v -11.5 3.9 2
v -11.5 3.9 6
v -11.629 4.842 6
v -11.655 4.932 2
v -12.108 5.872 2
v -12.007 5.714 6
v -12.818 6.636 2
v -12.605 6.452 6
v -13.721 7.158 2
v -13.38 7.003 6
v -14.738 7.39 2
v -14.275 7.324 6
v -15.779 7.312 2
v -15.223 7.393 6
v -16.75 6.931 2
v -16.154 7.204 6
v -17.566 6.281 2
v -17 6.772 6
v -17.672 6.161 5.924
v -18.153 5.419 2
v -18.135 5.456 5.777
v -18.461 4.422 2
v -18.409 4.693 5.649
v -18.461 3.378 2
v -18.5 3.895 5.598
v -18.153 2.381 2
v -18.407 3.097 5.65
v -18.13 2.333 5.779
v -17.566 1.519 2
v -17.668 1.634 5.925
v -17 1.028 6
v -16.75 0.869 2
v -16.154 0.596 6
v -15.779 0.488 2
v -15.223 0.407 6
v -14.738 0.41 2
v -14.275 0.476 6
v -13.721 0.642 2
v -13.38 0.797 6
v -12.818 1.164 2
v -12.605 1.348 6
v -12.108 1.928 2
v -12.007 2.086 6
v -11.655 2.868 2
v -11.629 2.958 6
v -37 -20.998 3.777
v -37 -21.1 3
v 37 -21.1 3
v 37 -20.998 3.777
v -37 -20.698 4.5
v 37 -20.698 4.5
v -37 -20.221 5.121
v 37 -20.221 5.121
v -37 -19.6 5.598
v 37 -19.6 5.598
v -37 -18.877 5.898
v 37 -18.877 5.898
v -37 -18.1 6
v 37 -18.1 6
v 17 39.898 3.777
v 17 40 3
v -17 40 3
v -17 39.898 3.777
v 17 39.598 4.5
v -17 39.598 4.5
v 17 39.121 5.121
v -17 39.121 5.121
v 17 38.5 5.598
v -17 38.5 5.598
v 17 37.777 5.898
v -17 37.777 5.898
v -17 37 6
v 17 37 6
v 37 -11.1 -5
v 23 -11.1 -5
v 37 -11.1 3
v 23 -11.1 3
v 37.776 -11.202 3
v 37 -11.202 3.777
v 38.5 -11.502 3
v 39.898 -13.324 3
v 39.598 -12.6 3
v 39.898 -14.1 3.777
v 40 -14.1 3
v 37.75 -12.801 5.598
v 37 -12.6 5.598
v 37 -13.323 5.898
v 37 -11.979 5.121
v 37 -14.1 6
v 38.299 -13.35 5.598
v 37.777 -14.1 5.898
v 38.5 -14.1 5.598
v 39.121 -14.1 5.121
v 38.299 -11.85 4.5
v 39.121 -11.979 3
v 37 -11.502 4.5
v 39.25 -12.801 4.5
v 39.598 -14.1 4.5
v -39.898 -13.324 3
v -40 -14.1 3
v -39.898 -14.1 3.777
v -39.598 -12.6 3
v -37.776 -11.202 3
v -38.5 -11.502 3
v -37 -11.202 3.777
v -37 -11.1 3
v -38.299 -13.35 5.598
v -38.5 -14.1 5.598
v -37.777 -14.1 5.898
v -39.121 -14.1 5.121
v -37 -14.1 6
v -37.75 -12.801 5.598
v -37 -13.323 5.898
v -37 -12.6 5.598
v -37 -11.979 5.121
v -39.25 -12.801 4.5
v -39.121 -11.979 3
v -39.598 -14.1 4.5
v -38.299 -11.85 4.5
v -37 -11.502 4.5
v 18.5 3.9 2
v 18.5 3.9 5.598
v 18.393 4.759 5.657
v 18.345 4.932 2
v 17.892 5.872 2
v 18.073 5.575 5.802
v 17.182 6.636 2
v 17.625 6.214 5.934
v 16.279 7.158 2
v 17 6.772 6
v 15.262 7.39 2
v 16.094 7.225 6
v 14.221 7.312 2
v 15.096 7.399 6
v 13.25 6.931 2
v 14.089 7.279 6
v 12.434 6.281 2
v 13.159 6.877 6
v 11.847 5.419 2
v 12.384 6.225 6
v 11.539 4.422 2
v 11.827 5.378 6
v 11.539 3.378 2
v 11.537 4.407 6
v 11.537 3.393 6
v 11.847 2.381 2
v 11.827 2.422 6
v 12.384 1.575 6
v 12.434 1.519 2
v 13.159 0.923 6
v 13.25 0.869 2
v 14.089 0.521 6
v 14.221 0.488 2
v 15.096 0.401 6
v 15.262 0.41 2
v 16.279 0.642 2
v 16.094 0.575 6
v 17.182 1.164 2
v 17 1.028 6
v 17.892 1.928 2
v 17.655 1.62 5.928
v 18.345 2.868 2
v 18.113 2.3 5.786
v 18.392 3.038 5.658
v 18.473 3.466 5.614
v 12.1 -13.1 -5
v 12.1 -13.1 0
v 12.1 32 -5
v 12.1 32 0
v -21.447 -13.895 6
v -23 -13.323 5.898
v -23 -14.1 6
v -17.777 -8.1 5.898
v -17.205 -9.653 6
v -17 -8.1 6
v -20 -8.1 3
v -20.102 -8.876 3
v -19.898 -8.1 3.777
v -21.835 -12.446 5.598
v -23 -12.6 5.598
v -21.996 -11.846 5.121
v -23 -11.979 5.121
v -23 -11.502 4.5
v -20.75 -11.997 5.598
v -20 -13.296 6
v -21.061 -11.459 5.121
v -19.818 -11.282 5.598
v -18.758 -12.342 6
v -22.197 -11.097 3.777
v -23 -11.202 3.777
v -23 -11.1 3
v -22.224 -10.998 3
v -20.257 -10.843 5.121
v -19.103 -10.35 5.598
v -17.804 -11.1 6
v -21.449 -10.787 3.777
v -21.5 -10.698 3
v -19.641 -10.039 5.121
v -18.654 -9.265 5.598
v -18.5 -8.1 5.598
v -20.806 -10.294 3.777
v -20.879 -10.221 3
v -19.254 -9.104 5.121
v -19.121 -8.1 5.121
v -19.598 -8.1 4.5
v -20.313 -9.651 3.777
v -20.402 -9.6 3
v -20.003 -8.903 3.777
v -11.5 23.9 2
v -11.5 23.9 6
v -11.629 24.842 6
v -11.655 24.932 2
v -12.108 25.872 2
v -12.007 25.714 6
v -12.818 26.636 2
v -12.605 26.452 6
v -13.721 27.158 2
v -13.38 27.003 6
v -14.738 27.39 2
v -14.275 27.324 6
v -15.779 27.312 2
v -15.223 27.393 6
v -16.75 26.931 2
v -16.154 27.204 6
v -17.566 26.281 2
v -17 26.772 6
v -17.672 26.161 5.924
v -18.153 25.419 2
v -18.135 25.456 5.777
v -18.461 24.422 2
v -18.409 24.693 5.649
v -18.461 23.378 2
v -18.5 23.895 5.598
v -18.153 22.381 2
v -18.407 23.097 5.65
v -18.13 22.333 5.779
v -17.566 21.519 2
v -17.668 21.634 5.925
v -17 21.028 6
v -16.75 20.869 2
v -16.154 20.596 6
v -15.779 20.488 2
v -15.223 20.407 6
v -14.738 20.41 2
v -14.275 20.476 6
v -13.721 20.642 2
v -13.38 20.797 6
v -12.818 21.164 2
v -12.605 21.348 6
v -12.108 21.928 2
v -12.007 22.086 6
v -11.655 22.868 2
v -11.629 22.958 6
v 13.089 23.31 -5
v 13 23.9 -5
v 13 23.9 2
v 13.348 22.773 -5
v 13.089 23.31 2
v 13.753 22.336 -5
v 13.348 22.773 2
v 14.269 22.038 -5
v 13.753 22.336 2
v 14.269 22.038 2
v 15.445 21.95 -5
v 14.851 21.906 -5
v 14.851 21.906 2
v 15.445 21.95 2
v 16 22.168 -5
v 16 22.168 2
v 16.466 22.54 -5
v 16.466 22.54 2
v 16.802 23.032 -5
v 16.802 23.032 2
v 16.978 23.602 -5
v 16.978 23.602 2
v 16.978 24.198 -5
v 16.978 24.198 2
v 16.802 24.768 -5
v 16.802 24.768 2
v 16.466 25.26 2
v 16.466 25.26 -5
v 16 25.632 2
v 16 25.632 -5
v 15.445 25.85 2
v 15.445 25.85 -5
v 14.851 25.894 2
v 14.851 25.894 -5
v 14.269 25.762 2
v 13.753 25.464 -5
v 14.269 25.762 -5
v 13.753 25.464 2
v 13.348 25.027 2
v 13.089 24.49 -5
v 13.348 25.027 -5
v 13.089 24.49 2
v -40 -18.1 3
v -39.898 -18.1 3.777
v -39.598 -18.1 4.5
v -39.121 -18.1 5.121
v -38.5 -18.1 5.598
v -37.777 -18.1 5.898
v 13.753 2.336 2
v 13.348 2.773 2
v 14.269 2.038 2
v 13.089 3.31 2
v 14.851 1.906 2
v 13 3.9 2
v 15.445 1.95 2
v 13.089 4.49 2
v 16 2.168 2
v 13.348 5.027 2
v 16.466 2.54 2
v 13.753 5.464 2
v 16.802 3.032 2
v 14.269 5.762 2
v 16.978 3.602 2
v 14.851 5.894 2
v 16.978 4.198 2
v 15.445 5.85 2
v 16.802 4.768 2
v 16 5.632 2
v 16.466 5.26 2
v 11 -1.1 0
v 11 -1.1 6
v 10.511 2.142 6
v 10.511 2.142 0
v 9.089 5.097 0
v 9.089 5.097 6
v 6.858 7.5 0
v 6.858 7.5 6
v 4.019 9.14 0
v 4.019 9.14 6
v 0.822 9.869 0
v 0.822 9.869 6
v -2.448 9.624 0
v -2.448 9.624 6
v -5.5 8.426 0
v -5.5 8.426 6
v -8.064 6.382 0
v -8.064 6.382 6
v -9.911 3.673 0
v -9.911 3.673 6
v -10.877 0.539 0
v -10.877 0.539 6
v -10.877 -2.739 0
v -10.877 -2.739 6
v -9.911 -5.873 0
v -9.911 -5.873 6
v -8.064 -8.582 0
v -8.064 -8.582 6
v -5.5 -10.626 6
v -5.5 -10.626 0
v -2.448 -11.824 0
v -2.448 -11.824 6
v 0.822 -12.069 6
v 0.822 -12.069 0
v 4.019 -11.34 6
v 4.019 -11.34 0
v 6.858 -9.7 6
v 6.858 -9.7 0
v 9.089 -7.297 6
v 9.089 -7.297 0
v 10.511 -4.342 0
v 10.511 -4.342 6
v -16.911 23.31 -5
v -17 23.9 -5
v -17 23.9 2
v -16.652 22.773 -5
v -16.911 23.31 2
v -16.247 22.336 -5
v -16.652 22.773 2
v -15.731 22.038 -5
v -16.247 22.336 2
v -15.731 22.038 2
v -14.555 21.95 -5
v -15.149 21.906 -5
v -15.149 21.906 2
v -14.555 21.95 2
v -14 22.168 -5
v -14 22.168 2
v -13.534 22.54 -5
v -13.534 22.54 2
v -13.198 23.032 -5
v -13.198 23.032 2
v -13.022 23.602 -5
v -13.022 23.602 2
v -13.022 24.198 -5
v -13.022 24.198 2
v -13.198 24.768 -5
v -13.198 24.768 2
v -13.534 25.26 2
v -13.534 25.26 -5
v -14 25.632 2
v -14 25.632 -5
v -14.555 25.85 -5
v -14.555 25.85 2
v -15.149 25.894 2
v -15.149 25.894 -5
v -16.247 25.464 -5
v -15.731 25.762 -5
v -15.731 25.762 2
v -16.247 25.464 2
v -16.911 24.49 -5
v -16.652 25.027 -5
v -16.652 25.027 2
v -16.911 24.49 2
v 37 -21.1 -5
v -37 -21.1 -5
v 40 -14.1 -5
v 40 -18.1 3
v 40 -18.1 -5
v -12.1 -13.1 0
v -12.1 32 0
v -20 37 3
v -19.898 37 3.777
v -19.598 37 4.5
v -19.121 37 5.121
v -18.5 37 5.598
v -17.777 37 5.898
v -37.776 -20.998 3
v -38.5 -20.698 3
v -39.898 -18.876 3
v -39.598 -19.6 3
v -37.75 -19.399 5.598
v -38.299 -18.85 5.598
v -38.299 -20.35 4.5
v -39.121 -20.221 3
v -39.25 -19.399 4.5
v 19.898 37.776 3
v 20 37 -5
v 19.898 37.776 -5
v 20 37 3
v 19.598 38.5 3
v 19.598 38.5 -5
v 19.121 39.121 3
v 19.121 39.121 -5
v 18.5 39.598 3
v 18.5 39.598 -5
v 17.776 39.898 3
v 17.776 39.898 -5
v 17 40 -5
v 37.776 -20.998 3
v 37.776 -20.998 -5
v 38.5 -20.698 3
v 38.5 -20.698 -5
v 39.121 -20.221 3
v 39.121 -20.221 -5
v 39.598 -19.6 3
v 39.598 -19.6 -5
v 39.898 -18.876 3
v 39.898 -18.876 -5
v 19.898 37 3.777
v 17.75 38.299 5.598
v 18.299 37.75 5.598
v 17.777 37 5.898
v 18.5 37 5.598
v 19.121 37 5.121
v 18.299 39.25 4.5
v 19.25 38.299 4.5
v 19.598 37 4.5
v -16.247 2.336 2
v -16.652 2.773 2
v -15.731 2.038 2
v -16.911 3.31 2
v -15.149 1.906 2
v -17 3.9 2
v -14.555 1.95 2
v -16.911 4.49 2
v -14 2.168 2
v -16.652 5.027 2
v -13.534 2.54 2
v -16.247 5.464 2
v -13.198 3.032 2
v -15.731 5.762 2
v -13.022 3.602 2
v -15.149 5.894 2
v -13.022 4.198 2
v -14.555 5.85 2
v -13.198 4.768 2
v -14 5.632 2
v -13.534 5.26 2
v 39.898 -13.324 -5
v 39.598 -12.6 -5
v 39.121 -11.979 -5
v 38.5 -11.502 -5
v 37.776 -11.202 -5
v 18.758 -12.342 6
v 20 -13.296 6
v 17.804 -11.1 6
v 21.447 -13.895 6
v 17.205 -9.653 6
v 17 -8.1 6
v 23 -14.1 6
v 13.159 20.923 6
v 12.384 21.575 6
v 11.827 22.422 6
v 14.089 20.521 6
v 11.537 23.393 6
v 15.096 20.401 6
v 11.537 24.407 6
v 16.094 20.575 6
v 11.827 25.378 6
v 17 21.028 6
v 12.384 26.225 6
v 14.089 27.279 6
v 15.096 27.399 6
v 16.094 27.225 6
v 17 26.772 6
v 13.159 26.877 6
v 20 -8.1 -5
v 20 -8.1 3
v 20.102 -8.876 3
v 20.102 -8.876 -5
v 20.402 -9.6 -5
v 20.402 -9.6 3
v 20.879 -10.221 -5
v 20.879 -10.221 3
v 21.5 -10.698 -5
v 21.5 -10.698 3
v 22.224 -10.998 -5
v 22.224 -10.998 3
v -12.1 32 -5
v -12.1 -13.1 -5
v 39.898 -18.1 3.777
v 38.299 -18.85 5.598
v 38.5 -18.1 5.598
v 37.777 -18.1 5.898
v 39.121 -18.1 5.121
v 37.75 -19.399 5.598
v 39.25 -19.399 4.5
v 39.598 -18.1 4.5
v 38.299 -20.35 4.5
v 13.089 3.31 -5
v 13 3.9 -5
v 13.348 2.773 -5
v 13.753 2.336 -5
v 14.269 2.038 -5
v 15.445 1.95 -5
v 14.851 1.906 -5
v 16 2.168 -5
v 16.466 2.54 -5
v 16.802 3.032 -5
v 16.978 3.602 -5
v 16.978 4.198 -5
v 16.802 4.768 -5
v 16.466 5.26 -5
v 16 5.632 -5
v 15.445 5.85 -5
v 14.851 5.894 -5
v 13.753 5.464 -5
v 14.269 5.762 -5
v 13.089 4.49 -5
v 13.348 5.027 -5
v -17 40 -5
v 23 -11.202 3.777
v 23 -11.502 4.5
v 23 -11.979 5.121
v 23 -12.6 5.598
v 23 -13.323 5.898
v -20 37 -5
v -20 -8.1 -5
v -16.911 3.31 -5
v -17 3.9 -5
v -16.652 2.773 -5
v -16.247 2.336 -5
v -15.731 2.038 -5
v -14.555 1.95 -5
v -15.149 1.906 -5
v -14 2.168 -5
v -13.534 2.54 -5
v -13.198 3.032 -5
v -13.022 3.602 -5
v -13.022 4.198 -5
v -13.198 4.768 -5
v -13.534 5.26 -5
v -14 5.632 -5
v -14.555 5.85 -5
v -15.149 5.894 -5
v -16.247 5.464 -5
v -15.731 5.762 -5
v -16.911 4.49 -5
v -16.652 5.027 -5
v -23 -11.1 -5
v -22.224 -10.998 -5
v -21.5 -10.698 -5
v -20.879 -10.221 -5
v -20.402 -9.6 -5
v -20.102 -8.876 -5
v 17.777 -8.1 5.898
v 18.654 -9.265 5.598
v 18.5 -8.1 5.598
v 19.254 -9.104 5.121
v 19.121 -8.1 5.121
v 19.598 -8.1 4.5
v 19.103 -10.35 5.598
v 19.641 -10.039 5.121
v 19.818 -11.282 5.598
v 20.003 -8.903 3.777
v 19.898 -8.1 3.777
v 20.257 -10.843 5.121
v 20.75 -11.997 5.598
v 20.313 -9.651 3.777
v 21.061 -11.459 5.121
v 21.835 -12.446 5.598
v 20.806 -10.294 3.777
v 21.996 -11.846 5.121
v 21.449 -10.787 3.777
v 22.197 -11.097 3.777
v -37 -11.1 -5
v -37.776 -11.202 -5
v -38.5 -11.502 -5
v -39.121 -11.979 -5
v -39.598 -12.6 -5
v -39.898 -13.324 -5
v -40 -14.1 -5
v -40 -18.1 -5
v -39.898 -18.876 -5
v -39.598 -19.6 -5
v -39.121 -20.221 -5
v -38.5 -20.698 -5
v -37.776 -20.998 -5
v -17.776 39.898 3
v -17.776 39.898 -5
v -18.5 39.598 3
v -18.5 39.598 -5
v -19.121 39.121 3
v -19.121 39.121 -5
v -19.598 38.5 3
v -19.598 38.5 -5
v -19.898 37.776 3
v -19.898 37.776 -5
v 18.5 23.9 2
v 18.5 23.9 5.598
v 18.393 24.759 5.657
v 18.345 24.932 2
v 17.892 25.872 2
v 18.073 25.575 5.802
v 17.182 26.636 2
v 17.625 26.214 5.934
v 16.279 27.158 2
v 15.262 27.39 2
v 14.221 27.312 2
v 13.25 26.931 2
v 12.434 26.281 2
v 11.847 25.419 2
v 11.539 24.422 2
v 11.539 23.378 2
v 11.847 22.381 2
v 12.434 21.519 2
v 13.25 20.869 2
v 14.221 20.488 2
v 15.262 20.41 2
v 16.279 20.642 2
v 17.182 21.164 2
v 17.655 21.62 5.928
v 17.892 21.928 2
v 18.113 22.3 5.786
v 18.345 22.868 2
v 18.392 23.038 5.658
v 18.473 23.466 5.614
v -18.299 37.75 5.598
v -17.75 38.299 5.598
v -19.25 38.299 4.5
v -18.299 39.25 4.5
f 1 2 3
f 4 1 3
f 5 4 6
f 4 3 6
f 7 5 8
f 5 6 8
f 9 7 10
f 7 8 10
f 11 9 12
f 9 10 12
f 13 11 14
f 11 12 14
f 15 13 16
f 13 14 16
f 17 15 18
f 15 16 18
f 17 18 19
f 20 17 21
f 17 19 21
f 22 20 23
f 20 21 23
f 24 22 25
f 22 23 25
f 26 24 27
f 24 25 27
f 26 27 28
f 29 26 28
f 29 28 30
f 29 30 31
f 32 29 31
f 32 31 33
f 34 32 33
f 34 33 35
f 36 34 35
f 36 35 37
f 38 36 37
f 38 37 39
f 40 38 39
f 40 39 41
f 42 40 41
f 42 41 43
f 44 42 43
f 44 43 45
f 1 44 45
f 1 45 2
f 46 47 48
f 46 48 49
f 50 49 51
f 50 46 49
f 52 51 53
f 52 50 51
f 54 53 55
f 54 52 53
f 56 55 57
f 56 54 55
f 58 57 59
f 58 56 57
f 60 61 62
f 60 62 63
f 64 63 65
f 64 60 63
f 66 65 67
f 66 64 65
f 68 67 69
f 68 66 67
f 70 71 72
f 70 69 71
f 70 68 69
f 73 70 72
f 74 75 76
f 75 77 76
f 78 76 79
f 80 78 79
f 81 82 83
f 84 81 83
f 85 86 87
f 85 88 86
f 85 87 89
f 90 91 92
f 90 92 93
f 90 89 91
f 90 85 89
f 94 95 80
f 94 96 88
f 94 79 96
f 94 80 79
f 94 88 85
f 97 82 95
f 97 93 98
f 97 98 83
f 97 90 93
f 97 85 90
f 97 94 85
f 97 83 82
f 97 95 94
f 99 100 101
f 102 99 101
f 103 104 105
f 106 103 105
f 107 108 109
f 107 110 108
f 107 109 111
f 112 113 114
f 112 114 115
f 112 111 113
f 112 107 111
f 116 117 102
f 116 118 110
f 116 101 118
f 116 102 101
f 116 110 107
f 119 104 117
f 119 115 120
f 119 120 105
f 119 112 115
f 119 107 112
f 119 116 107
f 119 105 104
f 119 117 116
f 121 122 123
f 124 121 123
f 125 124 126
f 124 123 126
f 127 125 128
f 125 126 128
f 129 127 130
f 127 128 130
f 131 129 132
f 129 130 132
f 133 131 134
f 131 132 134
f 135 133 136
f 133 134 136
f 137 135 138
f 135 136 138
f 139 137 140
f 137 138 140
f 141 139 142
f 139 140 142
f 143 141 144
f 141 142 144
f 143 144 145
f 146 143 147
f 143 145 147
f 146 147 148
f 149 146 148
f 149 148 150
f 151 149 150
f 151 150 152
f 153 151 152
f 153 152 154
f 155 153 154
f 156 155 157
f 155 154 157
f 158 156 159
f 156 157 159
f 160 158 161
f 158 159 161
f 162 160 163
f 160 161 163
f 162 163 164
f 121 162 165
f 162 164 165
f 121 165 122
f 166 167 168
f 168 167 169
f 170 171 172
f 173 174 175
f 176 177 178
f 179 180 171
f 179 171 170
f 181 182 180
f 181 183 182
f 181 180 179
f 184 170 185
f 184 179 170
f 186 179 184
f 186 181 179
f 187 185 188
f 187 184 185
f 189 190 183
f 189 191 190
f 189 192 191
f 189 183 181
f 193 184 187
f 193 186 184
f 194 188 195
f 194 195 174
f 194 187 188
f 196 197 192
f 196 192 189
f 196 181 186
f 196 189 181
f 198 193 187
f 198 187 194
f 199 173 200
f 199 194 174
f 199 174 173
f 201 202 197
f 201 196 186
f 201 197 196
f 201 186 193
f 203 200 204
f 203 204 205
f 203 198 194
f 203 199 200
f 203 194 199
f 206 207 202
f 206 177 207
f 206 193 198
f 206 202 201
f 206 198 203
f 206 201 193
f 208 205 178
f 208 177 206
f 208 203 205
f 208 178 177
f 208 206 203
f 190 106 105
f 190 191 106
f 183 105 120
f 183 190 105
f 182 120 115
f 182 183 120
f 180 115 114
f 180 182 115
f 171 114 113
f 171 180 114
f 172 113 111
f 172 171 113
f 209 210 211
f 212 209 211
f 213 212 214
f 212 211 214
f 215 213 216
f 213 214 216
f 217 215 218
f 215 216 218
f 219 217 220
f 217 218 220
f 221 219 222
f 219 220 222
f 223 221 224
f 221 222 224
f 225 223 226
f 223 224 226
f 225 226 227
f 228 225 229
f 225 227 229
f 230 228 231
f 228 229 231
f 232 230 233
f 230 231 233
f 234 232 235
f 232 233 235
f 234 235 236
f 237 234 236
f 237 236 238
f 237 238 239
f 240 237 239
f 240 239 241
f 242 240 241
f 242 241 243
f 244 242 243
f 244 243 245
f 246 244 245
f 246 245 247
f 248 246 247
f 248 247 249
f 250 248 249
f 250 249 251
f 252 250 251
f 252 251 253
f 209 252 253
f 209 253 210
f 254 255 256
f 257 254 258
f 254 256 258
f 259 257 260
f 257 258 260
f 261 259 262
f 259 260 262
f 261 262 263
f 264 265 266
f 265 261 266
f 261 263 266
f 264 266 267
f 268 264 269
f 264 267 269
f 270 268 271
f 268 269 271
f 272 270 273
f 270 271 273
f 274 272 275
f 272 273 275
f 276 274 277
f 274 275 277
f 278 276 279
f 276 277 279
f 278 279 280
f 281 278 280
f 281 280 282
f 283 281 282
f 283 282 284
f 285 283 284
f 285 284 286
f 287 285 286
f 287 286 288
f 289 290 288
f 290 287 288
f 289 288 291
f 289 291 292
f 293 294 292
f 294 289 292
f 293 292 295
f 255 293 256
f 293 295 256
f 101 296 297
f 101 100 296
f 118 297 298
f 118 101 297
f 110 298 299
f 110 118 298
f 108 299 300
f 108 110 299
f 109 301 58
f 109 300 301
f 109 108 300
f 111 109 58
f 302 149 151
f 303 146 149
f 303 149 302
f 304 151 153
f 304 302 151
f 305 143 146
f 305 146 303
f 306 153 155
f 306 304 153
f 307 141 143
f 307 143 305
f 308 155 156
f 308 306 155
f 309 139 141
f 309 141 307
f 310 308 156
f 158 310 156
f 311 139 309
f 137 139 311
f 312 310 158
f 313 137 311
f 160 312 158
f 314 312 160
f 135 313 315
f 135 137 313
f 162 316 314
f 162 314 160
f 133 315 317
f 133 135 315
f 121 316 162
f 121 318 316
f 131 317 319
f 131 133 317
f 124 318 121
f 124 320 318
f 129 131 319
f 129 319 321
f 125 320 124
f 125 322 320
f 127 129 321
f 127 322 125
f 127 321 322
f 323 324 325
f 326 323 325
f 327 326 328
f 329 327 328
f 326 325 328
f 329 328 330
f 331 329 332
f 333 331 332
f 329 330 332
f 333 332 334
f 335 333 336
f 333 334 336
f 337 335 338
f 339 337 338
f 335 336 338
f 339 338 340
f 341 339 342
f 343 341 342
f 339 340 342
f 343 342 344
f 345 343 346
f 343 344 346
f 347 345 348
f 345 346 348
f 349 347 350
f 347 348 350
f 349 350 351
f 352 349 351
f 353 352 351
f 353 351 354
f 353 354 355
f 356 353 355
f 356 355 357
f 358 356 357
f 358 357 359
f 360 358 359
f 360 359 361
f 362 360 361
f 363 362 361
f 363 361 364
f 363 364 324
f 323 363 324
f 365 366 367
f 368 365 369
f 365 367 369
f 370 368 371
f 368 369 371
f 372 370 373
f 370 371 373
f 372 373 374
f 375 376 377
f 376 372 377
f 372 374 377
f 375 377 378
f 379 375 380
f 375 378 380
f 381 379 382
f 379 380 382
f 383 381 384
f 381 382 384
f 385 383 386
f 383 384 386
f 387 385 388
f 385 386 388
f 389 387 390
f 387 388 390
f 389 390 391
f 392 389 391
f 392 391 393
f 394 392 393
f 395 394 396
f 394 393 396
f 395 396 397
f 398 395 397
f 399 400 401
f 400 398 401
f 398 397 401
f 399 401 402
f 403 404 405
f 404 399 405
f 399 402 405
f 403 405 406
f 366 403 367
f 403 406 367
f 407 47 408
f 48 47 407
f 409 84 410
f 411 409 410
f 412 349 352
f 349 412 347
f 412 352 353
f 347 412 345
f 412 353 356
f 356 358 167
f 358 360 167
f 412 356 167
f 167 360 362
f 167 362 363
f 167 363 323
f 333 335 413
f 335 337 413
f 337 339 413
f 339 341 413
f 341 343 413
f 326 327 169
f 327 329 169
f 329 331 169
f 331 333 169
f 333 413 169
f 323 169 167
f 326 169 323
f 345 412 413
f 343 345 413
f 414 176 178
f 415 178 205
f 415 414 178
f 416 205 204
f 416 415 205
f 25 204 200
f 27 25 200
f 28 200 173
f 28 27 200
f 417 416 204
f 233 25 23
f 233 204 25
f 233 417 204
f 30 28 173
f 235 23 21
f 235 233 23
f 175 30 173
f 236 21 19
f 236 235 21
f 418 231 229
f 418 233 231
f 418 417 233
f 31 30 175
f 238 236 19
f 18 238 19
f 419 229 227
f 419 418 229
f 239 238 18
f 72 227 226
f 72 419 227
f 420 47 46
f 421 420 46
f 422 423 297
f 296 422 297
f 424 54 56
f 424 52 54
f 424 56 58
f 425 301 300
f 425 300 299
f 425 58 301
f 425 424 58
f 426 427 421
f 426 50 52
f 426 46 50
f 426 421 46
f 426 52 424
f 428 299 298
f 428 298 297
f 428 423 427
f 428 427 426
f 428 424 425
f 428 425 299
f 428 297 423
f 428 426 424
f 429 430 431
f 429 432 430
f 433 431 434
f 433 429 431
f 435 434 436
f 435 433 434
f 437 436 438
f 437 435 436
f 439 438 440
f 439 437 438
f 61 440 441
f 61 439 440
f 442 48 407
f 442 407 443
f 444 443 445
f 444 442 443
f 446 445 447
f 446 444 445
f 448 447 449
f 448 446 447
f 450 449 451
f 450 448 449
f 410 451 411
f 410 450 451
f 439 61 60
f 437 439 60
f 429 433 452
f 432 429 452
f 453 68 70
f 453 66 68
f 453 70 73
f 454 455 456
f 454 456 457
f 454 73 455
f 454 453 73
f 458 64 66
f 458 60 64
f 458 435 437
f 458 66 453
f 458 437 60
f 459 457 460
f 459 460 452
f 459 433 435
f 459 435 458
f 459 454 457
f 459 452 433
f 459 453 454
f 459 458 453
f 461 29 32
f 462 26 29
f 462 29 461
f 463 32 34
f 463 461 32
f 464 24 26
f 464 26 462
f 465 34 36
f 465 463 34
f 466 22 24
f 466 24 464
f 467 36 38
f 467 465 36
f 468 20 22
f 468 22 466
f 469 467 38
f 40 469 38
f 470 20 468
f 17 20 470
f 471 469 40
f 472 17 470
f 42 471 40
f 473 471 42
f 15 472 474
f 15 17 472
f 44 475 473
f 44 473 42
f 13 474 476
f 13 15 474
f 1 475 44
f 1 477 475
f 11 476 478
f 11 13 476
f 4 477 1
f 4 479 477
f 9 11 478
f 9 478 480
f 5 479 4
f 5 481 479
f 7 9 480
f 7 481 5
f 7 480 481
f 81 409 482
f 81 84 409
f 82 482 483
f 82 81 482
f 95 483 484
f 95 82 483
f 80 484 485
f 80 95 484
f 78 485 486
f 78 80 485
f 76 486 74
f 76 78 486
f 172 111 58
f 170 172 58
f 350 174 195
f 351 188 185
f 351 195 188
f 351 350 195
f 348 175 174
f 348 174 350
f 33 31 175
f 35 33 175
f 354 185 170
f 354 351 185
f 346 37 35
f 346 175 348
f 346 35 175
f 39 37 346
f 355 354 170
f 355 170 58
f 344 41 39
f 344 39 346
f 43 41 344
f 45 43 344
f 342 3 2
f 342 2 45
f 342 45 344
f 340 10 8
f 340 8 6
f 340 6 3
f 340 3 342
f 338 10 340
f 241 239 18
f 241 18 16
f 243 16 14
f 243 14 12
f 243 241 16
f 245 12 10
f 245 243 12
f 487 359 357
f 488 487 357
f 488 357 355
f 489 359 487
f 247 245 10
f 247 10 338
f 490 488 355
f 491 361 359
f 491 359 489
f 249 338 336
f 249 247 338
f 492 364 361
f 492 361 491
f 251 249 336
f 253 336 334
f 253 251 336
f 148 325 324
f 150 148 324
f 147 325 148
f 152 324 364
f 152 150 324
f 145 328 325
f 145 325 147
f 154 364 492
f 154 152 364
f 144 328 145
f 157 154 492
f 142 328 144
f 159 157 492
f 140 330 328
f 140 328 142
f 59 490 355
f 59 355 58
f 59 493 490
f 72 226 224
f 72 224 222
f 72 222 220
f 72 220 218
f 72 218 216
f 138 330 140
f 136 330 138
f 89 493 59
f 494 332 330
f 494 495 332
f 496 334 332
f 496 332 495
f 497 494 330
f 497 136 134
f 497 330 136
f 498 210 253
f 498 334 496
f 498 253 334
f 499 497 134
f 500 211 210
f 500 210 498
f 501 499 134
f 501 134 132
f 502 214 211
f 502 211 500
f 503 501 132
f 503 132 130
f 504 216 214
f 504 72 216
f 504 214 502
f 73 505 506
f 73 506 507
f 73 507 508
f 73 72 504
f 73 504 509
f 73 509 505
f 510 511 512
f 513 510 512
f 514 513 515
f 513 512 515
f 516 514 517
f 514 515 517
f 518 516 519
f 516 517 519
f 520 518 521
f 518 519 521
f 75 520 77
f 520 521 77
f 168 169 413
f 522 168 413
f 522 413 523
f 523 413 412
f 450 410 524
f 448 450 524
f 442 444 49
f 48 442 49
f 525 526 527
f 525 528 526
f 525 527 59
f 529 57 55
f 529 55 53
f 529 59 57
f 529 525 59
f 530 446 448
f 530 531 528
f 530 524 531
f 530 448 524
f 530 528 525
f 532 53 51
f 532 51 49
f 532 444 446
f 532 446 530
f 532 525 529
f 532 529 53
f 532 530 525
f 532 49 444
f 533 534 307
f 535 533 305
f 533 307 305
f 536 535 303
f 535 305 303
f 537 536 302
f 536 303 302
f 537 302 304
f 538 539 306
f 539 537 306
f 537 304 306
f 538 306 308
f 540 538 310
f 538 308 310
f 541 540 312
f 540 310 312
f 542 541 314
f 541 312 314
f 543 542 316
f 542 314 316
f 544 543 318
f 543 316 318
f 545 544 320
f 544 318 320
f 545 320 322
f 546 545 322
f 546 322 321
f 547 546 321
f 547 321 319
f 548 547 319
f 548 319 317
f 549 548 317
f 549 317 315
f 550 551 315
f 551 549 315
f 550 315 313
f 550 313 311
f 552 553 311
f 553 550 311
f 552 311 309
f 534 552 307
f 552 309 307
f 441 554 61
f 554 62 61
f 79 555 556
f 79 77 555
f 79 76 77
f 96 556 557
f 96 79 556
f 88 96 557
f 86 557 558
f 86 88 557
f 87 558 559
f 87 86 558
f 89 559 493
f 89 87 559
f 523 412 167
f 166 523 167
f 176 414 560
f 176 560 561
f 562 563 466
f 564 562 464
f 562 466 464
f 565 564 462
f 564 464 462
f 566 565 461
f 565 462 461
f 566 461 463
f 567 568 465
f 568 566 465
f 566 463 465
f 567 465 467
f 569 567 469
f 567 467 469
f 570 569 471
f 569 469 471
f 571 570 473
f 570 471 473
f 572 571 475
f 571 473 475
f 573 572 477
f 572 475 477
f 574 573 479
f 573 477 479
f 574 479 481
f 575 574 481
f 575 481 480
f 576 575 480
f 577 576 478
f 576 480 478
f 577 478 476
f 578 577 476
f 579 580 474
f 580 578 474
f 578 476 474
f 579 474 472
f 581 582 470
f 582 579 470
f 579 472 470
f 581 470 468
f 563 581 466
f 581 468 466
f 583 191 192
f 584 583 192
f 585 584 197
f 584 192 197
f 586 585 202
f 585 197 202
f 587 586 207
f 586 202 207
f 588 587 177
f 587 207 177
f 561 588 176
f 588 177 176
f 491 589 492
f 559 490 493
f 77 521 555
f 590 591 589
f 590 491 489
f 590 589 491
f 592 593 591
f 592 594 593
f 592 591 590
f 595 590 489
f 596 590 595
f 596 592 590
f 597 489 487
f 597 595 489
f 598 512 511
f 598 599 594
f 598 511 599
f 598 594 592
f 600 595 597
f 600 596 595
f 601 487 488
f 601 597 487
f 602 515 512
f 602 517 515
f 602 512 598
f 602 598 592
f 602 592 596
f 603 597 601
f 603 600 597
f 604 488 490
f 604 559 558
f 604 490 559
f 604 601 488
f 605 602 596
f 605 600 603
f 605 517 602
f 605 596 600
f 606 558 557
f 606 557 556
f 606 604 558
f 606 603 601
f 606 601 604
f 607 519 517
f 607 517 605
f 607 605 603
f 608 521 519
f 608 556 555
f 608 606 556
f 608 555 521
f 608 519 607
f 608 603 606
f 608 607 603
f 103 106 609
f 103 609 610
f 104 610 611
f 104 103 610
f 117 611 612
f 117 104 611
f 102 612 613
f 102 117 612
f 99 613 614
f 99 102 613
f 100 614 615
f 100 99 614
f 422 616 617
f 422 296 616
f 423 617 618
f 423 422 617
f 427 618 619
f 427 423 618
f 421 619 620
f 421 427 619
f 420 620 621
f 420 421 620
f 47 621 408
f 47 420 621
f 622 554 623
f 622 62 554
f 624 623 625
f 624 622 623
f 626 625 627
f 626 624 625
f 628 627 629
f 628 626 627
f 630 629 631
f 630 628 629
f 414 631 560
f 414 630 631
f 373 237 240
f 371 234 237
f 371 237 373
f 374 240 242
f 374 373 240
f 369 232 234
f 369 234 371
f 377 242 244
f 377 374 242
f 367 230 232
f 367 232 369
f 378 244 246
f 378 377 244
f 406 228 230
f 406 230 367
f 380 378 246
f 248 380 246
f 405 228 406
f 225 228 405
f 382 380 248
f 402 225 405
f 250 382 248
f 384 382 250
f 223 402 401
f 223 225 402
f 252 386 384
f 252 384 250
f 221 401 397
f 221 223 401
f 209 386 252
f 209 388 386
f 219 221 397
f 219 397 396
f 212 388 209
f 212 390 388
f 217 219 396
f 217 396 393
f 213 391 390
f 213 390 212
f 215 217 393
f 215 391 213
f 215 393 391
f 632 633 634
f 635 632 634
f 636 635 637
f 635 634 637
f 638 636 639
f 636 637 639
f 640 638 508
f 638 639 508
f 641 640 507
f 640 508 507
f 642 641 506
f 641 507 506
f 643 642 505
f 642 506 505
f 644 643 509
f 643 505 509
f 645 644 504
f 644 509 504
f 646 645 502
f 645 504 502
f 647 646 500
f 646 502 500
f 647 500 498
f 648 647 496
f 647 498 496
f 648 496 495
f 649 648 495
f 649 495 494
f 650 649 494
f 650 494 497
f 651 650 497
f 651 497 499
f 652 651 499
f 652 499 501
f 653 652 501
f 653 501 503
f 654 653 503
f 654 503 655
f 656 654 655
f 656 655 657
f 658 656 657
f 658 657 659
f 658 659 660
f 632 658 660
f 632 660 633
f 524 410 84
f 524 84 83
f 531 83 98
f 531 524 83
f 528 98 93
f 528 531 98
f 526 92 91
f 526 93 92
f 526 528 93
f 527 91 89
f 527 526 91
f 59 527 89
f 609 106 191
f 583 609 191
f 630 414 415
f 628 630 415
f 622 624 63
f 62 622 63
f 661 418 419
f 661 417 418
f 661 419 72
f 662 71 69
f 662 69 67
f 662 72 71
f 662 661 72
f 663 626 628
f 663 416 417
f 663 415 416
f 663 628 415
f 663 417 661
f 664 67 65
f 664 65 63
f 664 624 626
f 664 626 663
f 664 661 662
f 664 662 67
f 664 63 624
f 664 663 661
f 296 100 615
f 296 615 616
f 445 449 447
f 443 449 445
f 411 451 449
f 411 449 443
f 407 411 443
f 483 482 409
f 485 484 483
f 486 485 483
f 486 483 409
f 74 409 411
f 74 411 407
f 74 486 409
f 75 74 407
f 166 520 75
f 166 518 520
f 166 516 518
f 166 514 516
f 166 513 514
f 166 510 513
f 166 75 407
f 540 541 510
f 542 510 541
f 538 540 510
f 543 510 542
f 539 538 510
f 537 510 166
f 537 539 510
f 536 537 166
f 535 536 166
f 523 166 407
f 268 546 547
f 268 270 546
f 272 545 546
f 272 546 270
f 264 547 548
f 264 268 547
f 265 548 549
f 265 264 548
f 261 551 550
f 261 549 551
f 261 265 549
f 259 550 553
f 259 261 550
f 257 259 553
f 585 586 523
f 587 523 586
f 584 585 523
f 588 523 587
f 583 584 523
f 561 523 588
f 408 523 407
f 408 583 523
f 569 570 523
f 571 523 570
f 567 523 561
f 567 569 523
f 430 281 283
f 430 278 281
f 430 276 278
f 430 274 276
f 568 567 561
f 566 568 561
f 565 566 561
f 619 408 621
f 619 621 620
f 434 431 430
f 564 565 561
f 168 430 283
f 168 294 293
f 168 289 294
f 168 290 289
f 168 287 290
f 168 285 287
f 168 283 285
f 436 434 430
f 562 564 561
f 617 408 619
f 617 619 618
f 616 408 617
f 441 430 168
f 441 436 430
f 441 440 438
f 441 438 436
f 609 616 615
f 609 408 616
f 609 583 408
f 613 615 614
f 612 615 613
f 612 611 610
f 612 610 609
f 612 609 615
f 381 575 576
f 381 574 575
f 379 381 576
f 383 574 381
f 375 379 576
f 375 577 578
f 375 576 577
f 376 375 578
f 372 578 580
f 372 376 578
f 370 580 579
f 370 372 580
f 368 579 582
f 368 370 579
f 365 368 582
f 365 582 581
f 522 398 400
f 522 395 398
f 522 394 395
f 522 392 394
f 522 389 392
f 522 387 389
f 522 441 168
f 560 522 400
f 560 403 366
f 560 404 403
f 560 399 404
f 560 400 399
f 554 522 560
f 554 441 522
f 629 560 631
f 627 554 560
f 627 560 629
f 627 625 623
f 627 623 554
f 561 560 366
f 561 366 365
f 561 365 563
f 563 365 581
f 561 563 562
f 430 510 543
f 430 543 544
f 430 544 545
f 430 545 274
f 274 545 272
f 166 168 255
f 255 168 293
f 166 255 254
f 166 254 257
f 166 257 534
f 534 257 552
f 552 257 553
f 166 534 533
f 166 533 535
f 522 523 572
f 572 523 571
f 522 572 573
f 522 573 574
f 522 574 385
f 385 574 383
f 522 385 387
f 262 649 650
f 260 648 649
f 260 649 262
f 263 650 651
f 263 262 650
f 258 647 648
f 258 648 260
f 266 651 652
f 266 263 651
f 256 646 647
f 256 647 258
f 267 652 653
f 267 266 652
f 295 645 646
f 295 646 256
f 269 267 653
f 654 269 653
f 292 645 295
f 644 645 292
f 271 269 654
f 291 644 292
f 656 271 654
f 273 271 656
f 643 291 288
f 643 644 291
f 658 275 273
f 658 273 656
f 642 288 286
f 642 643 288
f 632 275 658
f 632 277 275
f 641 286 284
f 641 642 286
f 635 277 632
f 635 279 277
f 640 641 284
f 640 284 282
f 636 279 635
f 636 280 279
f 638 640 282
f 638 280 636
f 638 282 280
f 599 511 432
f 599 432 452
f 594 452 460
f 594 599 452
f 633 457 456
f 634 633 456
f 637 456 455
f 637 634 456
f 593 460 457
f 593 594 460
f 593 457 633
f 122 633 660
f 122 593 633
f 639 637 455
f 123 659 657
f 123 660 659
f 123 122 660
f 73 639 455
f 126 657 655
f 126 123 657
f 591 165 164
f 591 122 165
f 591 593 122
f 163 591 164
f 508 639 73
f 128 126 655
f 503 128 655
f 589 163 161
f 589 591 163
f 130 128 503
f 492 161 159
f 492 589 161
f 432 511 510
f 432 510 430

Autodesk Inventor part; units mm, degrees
ref_plane "YZ Plane" through (0, 0, 0) normal (1, 0, 0) x (0, 1, 0)
ref_plane "XZ Plane" through (0, 0, 0) normal (0, 1, 0) x (-1, 0, 0)
ref_plane "XY Plane" through (0, 0, 0) normal (0, 0, 1) x (1, 0, 0)
sketch "Sketch1" plane through (0, 0, 0) normal (0, 0, 1) x (1, 0, 0)
  line L0 (-40, -40) -> (40, -40)
  line L1 (40, -40) -> (40, 40)
  line L2 (40, 40) -> (-40, 40)
  line L3 (-40, 40) -> (-40, -40)
  line L4 (-40, -40) -> (40, 40) construction
  line L5 (40, -40) -> (-40, 40) construction
  point P0 (0, 0)
  dimension "d0" = 80
  dimension "d1" = 80
extrude "Extrusion1" add sketch "Sketch1" along normal blind 6
sketch "Sketch2" plane through (0, 0, 0) normal (0, 0, -1) x (-1, 0, 0)
  arc A0 (37, -21.1) -> (40, -18.1) centre (37, -18.1) ccw projected
  line L0 (37, -21.1) -> (-37, -21.1) projected
  arc A1 (-40, -18.1) -> (-37, -21.1) centre (-37, -18.1) ccw projected
  line L1 (-40, -14.1) -> (-40, -18.1) projected
  arc A2 (-37, -11.1) -> (-40, -14.1) centre (-37, -14.1) ccw projected
  line L2 (-23, -11.1) -> (-37, -11.1) projected
  arc A3 (-23, -11.1) -> (-20, -8.1) centre (-23, -8.1) ccw projected
  line L3 (-20, -8.1) -> (-20, 37) projected
  arc A4 (-17, 40) -> (-20, 37) centre (-17, 37) ccw projected
  line L4 (17, 40) -> (-17, 40) projected
  arc A5 (20, 37) -> (17, 40) centre (17, 37) ccw projected
  line L5 (20, 37) -> (20, -8.1) projected
  arc A6 (20, -8.1) -> (23, -11.1) centre (23, -8.1) ccw projected
  line L6 (37, -11.1) -> (23, -11.1) projected
  arc A7 (40, -14.1) -> (37, -11.1) centre (37, -14.1) ccw projected
  line L7 (40, -14.1) -> (40, -18.1) projected
  circle A8 centre (15, 3.9) radius 2 projected
  circle A9 centre (-15, 3.9) radius 2 projected
  circle A10 centre (15, 23.9) radius 2 projected
  circle A11 centre (-15, 23.9) radius 2 projected
  line L8 (12.1, 32) -> (12.1, -13.1) projected
  line L9 (-12.1, 32) -> (12.1, 32) projected
  line L10 (-12.1, -13.1) -> (-12.1, 32) projected
  line L11 (12.1, -13.1) -> (-12.1, -13.1) projected
  circle A12 centre (0, -1.1) radius 7.5 projected
  line L12 (-40, -40) -> (40, -40)
  line L13 (40, -40) -> (40, 40)
  line L14 (40, 40) -> (-40, 40)
  line L15 (-40, 40) -> (-40, -40)
  line L16 (-40, -40) -> (40, 40) construction
  line L17 (40, -40) -> (-40, 40) construction
  line L18 (-40, 40) -> (40, 40) projected
  line L19 (40, 40) -> (40, -40) projected
  line L20 (-40, -40) -> (-40, 40) projected
  line L21 (40, -40) -> (-40, -40) projected
  point P0 (0, 0)
  point P1 (0, 0)
  point P2 (-40, -18.1)
extrude "Extrusion2" cut sketch "Sketch2" against normal blind 6 contours A0 L13 L12 L15 A1 L0 | A7 L6 A6 L5 A5 L14 L13 | L15 L14 A4 L3 A3 L2 A2 | A8 | A9 | A10 | A11 | A12
sketch "Sketch3" plane through (0, 0, 0) normal (0, 0, -1) x (-1, 0, 0)
  arc A0 (37, -21.1) -> (40, -18.1) centre (37, -18.1) ccw projected
  line L0 (37, -21.1) -> (-37, -21.1) projected
  arc A1 (-40, -18.1) -> (-37, -21.1) centre (-37, -18.1) ccw projected
  line L1 (-40, -14.1) -> (-40, -18.1) projected
  arc A2 (-37, -11.1) -> (-40, -14.1) centre (-37, -14.1) ccw projected
  line L2 (-23, -11.1) -> (-37, -11.1) projected
  arc A3 (-23, -11.1) -> (-20, -8.1) centre (-23, -8.1) ccw projected
  line L3 (-20, -8.1) -> (-20, 37) projected
  arc A4 (-17, 40) -> (-20, 37) centre (-17, 37) ccw projected
  line L4 (17, 40) -> (-17, 40) projected
  arc A5 (20, 37) -> (17, 40) centre (17, 37) ccw projected
  line L5 (20, 37) -> (20, -8.1) projected
  arc A6 (20, -8.1) -> (23, -11.1) centre (23, -8.1) ccw projected
  line L6 (37, -11.1) -> (23, -11.1) projected
  arc A7 (40, -14.1) -> (37, -11.1) centre (37, -14.1) ccw projected
  line L7 (40, -14.1) -> (40, -18.1) projected
  circle A8 centre (15, 3.9) radius 2 projected
  circle A9 centre (-15, 3.9) radius 2 projected
  circle A10 centre (15, 23.9) radius 2 projected
  circle A11 centre (-15, 23.9) radius 2 projected
  line L8 (12.1, 32) -> (12.1, -13.1) projected
  line L9 (-12.1, 32) -> (12.1, 32) projected
  line L10 (-12.1, -13.1) -> (-12.1, 32) projected
  line L11 (12.1, -13.1) -> (-12.1, -13.1) projected
  point P0 (0, 0)
extrude "Extrusion3" add sketch "Sketch3" along normal blind 5
sketch "Sketch4" plane through (0, 0, 6) normal (0, 0, 1) x (1, 0, 0)
  circle A0 centre (0, -1.1) radius 7.5 projected
  circle A1 centre (0, -1.1) radius 11
  point P0 (0, 0)
  dimension "d8" = 22
extrude "Extrusion4" cut sketch "Sketch4" against normal through all
fillet "Fillet1" radius 3 16 edges at (-19.1213, 39.1213, 6) (-20, 14.45, 6) (-20.8787, -10.2213, 6) (-30, -11.1, 6) (-39.1213, -11.9787, 6) (-40, -16.1, 6) (-39.1213, -20.2213, 6) (0, -21.1, 6) (39.1213, -20.2213, 6) (40, -16.1, 6) (39.1213, -11.9787, 6) (30, -11.1, 6) (20.8787, -10.2213, 6) (20, 14.45, 6) (19.1213, 39.1213, 6) (0, 40, 6)
sketch "Sketch5" plane through (0, 0, 6) normal (0, 0, 1) x (1, 0, 0)
  circle A0 centre (-15, 23.9) radius 2 projected
  line L0 (-17, 3.9) -> (-17, 23.9) projected
  circle A1 centre (-15, 3.9) radius 2 projected
  line L1 (-17, -8.1) -> (-17, 3.9) projected
  arc A2 (-23, -14.1) -> (-17, -8.1) centre (-23, -8.1) ccw projected
  line L2 (-37, -14.1) -> (-23, -14.1) projected
  line L3 (-37, -18.1) -> (-37, -14.1) projected
  line L4 (37, -18.1) -> (-37, -18.1) projected
  line L5 (37, -14.1) -> (37, -18.1) projected
  line L6 (23, -14.1) -> (37, -14.1) projected
  arc A3 (17, -8.1) -> (23, -14.1) centre (23, -8.1) ccw projected
  line L7 (17, 3.9) -> (17, -8.1) projected
  circle A4 centre (15, 3.9) radius 2 projected
  line L8 (17, 23.9) -> (17, 3.9) projected
  circle A5 centre (15, 23.9) radius 2 projected
  line L9 (17, 37) -> (17, 23.9) projected
  line L10 (-17, 37) -> (17, 37) projected
  line L11 (-17, 23.9) -> (-17, 37) projected
  circle A6 centre (0, -1.1) radius 11 projected
  circle A7 centre (-15, 23.9) radius 3.5
  circle A8 centre (15, 23.9) radius 3.5
  circle A9 centre (-15, 3.9) radius 3.5
  circle A10 centre (15, 3.9) radius 3.5
  point P0 (0, 0)
  dimension "d12" = 7
  dimension "d13" = 7
  dimension "d14" = 7
  dimension "d15" = 7
extrude "Extrusion5" cut sketch "Sketch5" against normal blind 4 contours L11 A7 L0 | L0 A7 L11 | A9 L1 L0 | L0 L1 A9 | A8 L8 L9 | L9 L8 A8 | A10 L7 L8 | L8 L7 A10
properties part number "stopper_motor_bracket_cover"
